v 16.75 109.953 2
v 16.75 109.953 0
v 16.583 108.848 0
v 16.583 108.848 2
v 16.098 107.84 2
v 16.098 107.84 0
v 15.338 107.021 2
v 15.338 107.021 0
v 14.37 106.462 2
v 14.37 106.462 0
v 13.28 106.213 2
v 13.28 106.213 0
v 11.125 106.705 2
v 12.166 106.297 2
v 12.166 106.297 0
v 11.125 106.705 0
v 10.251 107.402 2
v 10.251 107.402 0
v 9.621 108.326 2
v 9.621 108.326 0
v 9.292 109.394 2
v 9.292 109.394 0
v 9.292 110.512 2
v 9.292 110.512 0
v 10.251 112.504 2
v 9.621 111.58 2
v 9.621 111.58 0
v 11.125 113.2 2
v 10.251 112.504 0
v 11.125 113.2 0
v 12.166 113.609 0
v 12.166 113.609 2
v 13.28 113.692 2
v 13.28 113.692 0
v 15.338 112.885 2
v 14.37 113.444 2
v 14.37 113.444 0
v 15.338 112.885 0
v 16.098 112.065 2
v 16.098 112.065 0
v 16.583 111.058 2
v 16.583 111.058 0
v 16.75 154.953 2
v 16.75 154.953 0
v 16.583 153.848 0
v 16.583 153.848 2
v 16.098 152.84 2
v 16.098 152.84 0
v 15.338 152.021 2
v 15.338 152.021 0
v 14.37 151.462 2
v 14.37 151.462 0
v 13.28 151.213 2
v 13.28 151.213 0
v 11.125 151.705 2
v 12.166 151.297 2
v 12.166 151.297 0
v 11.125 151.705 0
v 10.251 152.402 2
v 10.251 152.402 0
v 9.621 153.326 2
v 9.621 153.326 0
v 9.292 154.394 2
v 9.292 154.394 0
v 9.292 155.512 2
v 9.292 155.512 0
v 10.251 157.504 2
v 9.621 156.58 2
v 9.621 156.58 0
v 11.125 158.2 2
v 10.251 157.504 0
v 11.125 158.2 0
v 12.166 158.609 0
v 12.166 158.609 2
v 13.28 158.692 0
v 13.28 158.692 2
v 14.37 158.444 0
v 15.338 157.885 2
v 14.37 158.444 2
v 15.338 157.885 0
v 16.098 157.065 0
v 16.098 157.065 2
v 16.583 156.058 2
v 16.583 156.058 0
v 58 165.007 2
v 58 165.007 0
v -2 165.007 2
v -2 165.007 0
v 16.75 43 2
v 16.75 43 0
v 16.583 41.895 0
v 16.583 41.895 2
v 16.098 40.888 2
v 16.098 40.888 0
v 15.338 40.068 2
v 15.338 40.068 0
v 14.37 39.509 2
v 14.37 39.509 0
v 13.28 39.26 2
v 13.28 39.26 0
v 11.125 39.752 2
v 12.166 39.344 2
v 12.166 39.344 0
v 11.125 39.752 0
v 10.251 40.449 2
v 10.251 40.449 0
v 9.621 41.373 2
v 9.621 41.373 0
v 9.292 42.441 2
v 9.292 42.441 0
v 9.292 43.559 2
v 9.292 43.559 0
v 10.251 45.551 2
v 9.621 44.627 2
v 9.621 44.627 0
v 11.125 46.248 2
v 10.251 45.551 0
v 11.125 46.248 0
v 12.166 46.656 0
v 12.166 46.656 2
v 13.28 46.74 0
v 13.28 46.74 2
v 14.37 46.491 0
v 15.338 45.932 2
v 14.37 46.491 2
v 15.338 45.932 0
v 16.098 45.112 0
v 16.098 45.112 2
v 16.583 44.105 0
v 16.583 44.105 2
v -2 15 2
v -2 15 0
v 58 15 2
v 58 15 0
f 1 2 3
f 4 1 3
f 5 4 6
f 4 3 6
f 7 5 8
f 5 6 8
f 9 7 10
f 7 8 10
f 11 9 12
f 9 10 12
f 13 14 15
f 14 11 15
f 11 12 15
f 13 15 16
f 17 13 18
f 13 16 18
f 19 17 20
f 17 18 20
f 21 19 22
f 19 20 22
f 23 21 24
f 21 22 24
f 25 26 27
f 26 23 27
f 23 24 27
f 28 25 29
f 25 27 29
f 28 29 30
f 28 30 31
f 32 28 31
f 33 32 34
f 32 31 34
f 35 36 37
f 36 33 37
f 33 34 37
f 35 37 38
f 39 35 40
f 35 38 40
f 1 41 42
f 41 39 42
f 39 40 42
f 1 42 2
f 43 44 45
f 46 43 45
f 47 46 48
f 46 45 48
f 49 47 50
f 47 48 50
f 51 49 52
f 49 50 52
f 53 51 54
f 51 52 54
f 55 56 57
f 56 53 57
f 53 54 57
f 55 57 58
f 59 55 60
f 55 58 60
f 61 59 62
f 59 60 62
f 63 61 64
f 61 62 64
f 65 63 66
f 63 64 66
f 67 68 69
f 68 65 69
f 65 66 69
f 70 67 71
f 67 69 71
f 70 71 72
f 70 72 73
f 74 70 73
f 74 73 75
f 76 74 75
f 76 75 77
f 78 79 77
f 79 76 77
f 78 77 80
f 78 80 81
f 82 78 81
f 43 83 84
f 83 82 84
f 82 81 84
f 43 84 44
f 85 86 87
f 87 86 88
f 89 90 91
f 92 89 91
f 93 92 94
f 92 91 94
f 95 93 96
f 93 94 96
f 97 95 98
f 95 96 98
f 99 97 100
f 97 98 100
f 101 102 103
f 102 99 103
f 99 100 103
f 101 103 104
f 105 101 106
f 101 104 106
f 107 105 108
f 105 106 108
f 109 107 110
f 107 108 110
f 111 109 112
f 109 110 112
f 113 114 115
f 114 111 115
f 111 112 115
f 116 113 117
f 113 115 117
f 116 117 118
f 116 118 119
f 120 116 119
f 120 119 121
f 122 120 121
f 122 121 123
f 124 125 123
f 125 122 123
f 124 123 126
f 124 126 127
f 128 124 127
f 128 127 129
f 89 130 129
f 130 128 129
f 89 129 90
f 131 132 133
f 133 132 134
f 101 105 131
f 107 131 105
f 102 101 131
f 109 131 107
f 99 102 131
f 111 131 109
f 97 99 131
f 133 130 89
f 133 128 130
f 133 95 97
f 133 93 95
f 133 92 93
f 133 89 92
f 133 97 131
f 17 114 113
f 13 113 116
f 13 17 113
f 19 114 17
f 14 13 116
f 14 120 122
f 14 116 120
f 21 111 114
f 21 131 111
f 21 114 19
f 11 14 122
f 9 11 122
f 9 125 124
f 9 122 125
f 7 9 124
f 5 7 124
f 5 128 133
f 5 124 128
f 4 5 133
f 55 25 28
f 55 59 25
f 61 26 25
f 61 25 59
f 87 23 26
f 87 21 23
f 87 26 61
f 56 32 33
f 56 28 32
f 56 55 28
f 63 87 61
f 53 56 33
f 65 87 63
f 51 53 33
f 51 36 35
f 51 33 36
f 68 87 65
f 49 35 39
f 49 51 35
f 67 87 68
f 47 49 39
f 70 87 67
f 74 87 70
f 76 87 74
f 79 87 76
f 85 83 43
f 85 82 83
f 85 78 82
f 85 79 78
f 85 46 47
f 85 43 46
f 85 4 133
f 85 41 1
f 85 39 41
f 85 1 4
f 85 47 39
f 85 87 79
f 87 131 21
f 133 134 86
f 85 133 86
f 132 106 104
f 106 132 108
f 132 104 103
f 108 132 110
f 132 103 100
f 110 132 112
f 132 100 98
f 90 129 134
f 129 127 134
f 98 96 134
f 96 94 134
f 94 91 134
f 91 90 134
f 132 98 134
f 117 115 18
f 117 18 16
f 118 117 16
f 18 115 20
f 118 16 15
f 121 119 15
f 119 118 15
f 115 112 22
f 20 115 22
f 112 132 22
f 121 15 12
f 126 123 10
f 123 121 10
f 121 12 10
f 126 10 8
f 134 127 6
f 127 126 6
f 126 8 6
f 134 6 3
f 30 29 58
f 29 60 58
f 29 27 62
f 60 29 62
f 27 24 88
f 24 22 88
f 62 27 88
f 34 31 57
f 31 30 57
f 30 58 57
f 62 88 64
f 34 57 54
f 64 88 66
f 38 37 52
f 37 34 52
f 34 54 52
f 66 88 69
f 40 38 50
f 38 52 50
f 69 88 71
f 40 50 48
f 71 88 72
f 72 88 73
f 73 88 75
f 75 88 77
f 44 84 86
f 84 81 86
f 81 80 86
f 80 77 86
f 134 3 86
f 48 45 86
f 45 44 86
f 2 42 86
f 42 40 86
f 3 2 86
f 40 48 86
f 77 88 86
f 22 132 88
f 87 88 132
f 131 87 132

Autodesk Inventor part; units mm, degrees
ref_plane "YZ Plane" through (0, 0, 0) normal (1, 0, 0) x (0, 1, 0)
ref_plane "XZ Plane" through (0, 0, 0) normal (0, 1, 0) x (-1, 0, 0)
ref_plane "XY Plane" through (0, 0, 0) normal (0, 0, 1) x (1, 0, 0)
sketch "Sketch1" plane through (0, 0, 0) normal (0, 0, 1) x (1, 0, 0)
  line L0 (16.1981, 153.4586) -> (16.9799, 152.4795) construction
  arc A0 (16.1981, 153.4586) -> (16.1981, 156.4471) centre (13, 154.9529) ccw construction
  line L1 (16.9799, 157.4262) -> (16.1981, 156.4471) construction
  arc A1 (16.9799, 157.4262) -> (15.4733, 158.9328) centre (16.1422, 158.0951) ccw construction
  line L2 (14.4942, 158.151) -> (15.4733, 158.9328) construction
  arc A2 (14.4942, 158.151) -> (11.5058, 158.151) centre (13, 154.9529) ccw construction
  line L3 (10.5267, 158.9328) -> (11.5058, 158.151) construction
  arc A3 (10.5267, 158.9328) -> (9.0201, 157.4262) centre (9.8578, 158.0951) ccw construction
  line L4 (9.8019, 156.4471) -> (9.0201, 157.4262) construction
  arc A4 (9.8019, 156.4471) -> (9.8019, 153.4586) centre (13, 154.9529) ccw construction
  line L5 (9.0201, 152.4795) -> (9.8019, 153.4586) construction
  arc A5 (9.0201, 152.4795) -> (10.5267, 150.9729) centre (9.8578, 151.8106) ccw construction
  line L6 (11.5058, 151.7547) -> (10.5267, 150.9729) construction
  arc A6 (11.5058, 151.7547) -> (14.4942, 151.7547) centre (13, 154.9529) ccw construction
  line L7 (15.4733, 150.9729) -> (14.4942, 151.7547) construction
  arc A7 (15.4733, 150.9729) -> (16.9799, 152.4795) centre (16.1422, 151.8106) ccw construction
  line L8 (26.6999, 145.0719) -> (26.6999, 142.2529) construction
  arc A8 (26.6999, 145.0719) -> (26.319, 145.4529) centre (26.319, 145.0719) ccw construction
  line L9 (22.88, 145.4529) -> (26.319, 145.4529) construction
  arc A9 (22.88, 145.4529) -> (22.5, 145.0729) centre (22.88, 145.0729) ccw construction
  line L10 (22.5, 141.6339) -> (22.5, 145.0729) construction
  arc A10 (22.5, 141.6339) -> (22.881, 141.2529) centre (22.881, 141.6339) ccw construction
  line L11 (25.7, 141.2529) -> (22.881, 141.2529) construction
  arc A11 (25.7, 141.2529) -> (26.6999, 142.2529) centre (25.7, 142.2529) ccw construction
  line L12 (-0.6999, 164.8338) -> (-0.6999, 167.6528) construction
  arc A12 (-0.6999, 164.8338) -> (-0.3189, 164.4528) centre (-0.3189, 164.8338) ccw construction
  line L13 (3.12, 164.4528) -> (-0.3189, 164.4528) construction
  arc A13 (3.12, 164.4528) -> (3.5, 164.8328) centre (3.12, 164.8328) ccw construction
  line L14 (3.5, 168.2718) -> (3.5, 164.8328) construction
  arc A14 (3.5, 168.2718) -> (3.119, 168.6528) centre (3.119, 168.2718) ccw construction
  line L15 (0.3001, 168.6528) -> (3.119, 168.6528) construction
  arc A15 (0.3001, 168.6528) -> (-0.6999, 167.6528) centre (0.3001, 167.6528) ccw construction
  line L16 (22.881, 168.6528) -> (25.7, 168.6528) construction
  arc A16 (22.881, 168.6528) -> (22.5, 168.2718) centre (22.881, 168.2718) ccw construction
  line L17 (22.5, 164.8328) -> (22.5, 168.2718) construction
  arc A17 (22.5, 164.8328) -> (22.88, 164.4528) centre (22.88, 164.8328) ccw construction
  line L18 (26.319, 164.4528) -> (22.88, 164.4528) construction
  arc A18 (26.319, 164.4528) -> (26.6999, 164.8338) centre (26.319, 164.8338) ccw construction
  line L19 (26.6999, 167.6528) -> (26.6999, 164.8338) construction
  arc A19 (26.6999, 167.6528) -> (25.7, 168.6528) centre (25.7, 167.6528) ccw construction
  line L20 (-0.3189, 145.4529) -> (3.12, 145.4529) construction
  arc A20 (-0.3189, 145.4529) -> (-0.6999, 145.0719) centre (-0.3189, 145.0719) ccw construction
  line L21 (-0.6999, 142.2529) -> (-0.6999, 145.0719) construction
  arc A21 (-0.6999, 142.2529) -> (0.3001, 141.2529) centre (0.3001, 142.2529) ccw construction
  line L22 (3.119, 141.2529) -> (0.3001, 141.2529) construction
  arc A22 (3.119, 141.2529) -> (3.5, 141.6339) centre (3.119, 141.6339) ccw construction
  line L23 (3.5, 145.0729) -> (3.5, 141.6339) construction
  arc A23 (3.5, 145.0729) -> (3.12, 145.4529) centre (3.12, 145.0729) ccw construction
  line L24 (8.5, 142.2104) -> (5.2675, 142.2104) construction
  arc A24 (9, 141.7104) -> (8.5, 142.2104) centre (8.5, 141.7104) ccw construction
  line L25 (9, 140.4529) -> (9, 141.7104) construction
  arc A25 (8.5, 139.9529) -> (9, 140.4529) centre (8.5, 140.4529) ccw construction
  line L26 (0.0001, 139.9529) -> (8.5, 139.9529) construction
  arc A26 (-1.9999, 141.9529) -> (0.0001, 139.9529) centre (0.0001, 141.9529) ccw construction
  line L27 (-1.9999, 150.4529) -> (-1.9999, 141.9529) construction
  arc A27 (-1.4999, 150.9529) -> (-1.9999, 150.4529) centre (-1.4999, 150.4529) ccw construction
  line L28 (-0.2425, 150.9529) -> (-1.4999, 150.9529) construction
  arc A28 (0.2575, 150.4529) -> (-0.2425, 150.9529) centre (-0.2425, 150.4529) ccw construction
  line L29 (0.2575, 147.2203) -> (0.2575, 150.4529) construction
  arc A29 (0.2575, 147.2203) -> (0.7572, 146.7029) centre (0.7572, 147.2029) ccw construction
  line L30 (2.7398, 146.7029) -> (0.7572, 146.7029) construction
  arc A30 (2.7398, 146.7029) -> (3.0934, 146.8493) centre (2.7398, 147.2029) ccw construction
  line L31 (7.0189, 150.7749) -> (3.0934, 146.8493) construction
  arc A31 (7.0189, 150.7749) -> (7.1653, 151.1284) centre (6.6653, 151.1284) ccw construction
  line L32 (7.1653, 154.0029) -> (7.1653, 151.1284) construction
  line L33 (7.6753, 154.9529) -> (7.1653, 154.0029) construction
  line L34 (7.1653, 155.9029) -> (7.6753, 154.9529) construction
  line L35 (7.1653, 158.7773) -> (7.1653, 155.9029) construction
  arc A32 (7.1653, 158.7773) -> (7.0189, 159.1309) centre (6.6653, 158.7773) ccw construction
  line L36 (3.0934, 163.0564) -> (7.0189, 159.1309) construction
  arc A33 (3.0934, 163.0564) -> (2.7398, 163.2028) centre (2.7398, 162.7028) ccw construction
  line L37 (0.7572, 163.2028) -> (2.7398, 163.2028) construction
  arc A34 (0.7572, 163.2028) -> (0.2575, 162.6854) centre (0.7572, 162.7028) ccw construction
  line L38 (0.2575, 159.4529) -> (0.2575, 162.6854) construction
  arc A35 (-0.2425, 158.9529) -> (0.2575, 159.4529) centre (-0.2425, 159.4529) ccw construction
  line L39 (-1.4999, 158.9529) -> (-0.2425, 158.9529) construction
  arc A36 (-1.9999, 159.4529) -> (-1.4999, 158.9529) centre (-1.4999, 159.4529) ccw construction
  line L40 (-1.9999, 167.9528) -> (-1.9999, 159.4529) construction
  arc A37 (0.0001, 169.9528) -> (-1.9999, 167.9528) centre (0.0001, 167.9528) ccw construction
  line L41 (8.5, 169.9528) -> (0.0001, 169.9528) construction
  arc A38 (9, 169.4528) -> (8.5, 169.9528) centre (8.5, 169.4528) ccw construction
  line L42 (9, 168.1953) -> (9, 169.4528) construction
  arc A39 (8.5, 167.6953) -> (9, 168.1953) centre (8.5, 168.1953) ccw construction
  line L43 (5.2675, 167.6953) -> (8.5, 167.6953) construction
  arc A40 (5.2675, 167.6953) -> (4.75, 167.1956) centre (5.25, 167.1956) ccw construction
  line L44 (4.75, 165.2131) -> (4.75, 167.1956) construction
  arc A41 (4.75, 165.2131) -> (4.8965, 164.8595) centre (5.25, 165.2131) ccw construction
  line L45 (8.822, 160.934) -> (4.8965, 164.8595) construction
  arc A42 (8.822, 160.934) -> (9.1756, 160.7875) centre (9.1756, 161.2875) ccw construction
  line L46 (12.1125, 160.7875) -> (9.1756, 160.7875) construction
  line L47 (13.0625, 160.2775) -> (12.1125, 160.7875) construction
  line L48 (14.0125, 160.7875) -> (13.0625, 160.2775) construction
  line L49 (16.8245, 160.7875) -> (14.0125, 160.7875) construction
  arc A43 (16.8245, 160.7875) -> (17.178, 160.934) centre (16.8245, 161.2875) ccw construction
  line L50 (21.1035, 164.8595) -> (17.178, 160.934) construction
  arc A44 (21.1035, 164.8595) -> (21.25, 165.2131) centre (20.75, 165.2131) ccw construction
  line L51 (21.25, 167.1956) -> (21.25, 165.2131) construction
  arc A45 (21.25, 167.1956) -> (20.7325, 167.6953) centre (20.75, 167.1956) ccw construction
  line L52 (17.5, 167.6953) -> (20.7325, 167.6953) construction
  arc A46 (17, 168.1953) -> (17.5, 167.6953) centre (17.5, 168.1953) ccw construction
  line L53 (17, 169.4528) -> (17, 168.1953) construction
  arc A47 (17.5, 169.9528) -> (17, 169.4528) centre (17.5, 169.4528) ccw construction
  line L54 (26, 169.9528) -> (17.5, 169.9528) construction
  arc A48 (27.9999, 167.9528) -> (26, 169.9528) centre (26, 167.9528) ccw construction
  line L55 (27.9999, 159.4529) -> (27.9999, 167.9528) construction
  arc A49 (27.4999, 158.9529) -> (27.9999, 159.4529) centre (27.4999, 159.4529) ccw construction
  line L56 (26.2425, 158.9529) -> (27.4999, 158.9529) construction
  arc A50 (25.7425, 159.4529) -> (26.2425, 158.9529) centre (26.2425, 159.4529) ccw construction
  line L57 (25.7425, 162.6854) -> (25.7425, 159.4529) construction
  arc A51 (25.7425, 162.6854) -> (25.2428, 163.2028) centre (25.2428, 162.7028) ccw construction
  line L58 (23.2602, 163.2028) -> (25.2428, 163.2028) construction
  arc A52 (23.2602, 163.2028) -> (22.9066, 163.0564) centre (23.2602, 162.7028) ccw construction
  line L59 (18.9811, 159.1309) -> (22.9066, 163.0564) construction
  arc A53 (18.9811, 159.1309) -> (18.8347, 158.7773) centre (19.3347, 158.7773) ccw construction
  line L60 (18.8347, 155.9029) -> (18.8347, 158.7773) construction
  line L61 (18.3247, 154.9529) -> (18.8347, 155.9029) construction
  line L62 (18.8347, 154.0029) -> (18.3247, 154.9529) construction
  line L63 (18.8347, 151.1284) -> (18.8347, 154.0029) construction
  arc A54 (18.8347, 151.1284) -> (18.9811, 150.7749) centre (19.3347, 151.1284) ccw construction
  line L64 (22.9066, 146.8493) -> (18.9811, 150.7749) construction
  arc A55 (22.9066, 146.8493) -> (23.2602, 146.7029) centre (23.2602, 147.2029) ccw construction
  line L65 (25.2428, 146.7029) -> (23.2602, 146.7029) construction
  arc A56 (25.2428, 146.7029) -> (25.7425, 147.2203) centre (25.2428, 147.2029) ccw construction
  line L66 (25.7425, 150.4529) -> (25.7425, 147.2203) construction
  arc A57 (26.2425, 150.9529) -> (25.7425, 150.4529) centre (26.2425, 150.4529) ccw construction
  line L67 (27.4999, 150.9529) -> (26.2425, 150.9529) construction
  arc A58 (27.9999, 150.4529) -> (27.4999, 150.9529) centre (27.4999, 150.4529) ccw construction
  line L68 (27.9999, 141.9529) -> (27.9999, 150.4529) construction
  arc A59 (26, 139.9529) -> (27.9999, 141.9529) centre (26, 141.9529) ccw construction
  line L69 (17.5, 139.9529) -> (26, 139.9529) construction
  arc A60 (17, 140.4529) -> (17.5, 139.9529) centre (17.5, 140.4529) ccw construction
  line L70 (17, 141.7104) -> (17, 140.4529) construction
  arc A61 (17.5, 142.2104) -> (17, 141.7104) centre (17.5, 141.7104) ccw construction
  line L71 (20.7325, 142.2104) -> (17.5, 142.2104) construction
  arc A62 (20.7325, 142.2104) -> (21.25, 142.7101) centre (20.75, 142.7101) ccw construction
  line L72 (21.25, 144.6927) -> (21.25, 142.7101) construction
  arc A63 (21.25, 144.6927) -> (21.1035, 145.0462) centre (20.75, 144.6927) ccw construction
  line L73 (17.178, 148.9717) -> (21.1035, 145.0462) construction
  arc A64 (17.178, 148.9717) -> (16.8245, 149.1182) centre (16.8245, 148.6182) ccw construction
  line L74 (14.0125, 149.1182) -> (16.8245, 149.1182) construction
  line L75 (13.0625, 149.6282) -> (14.0125, 149.1182) construction
  line L76 (12.1125, 149.1182) -> (13.0625, 149.6282) construction
  line L77 (9.1756, 149.1182) -> (12.1125, 149.1182) construction
  arc A65 (9.1756, 149.1182) -> (8.822, 148.9717) centre (9.1756, 148.6182) ccw construction
  line L78 (4.8965, 145.0462) -> (8.822, 148.9717) construction
  arc A66 (4.8965, 145.0462) -> (4.75, 144.6927) centre (5.25, 144.6927) ccw construction
  line L79 (4.75, 142.7101) -> (4.75, 144.6927) construction
  arc A67 (4.75, 142.7101) -> (5.2675, 142.2104) centre (5.25, 142.7101) ccw construction
  line L80 (16.1981, -1.4942) -> (16.9799, -2.4733) construction
  arc A68 (16.1981, -1.4942) -> (16.1981, 1.4942) centre (13, 0) ccw construction
  line L81 (16.9799, 2.4733) -> (16.1981, 1.4942) construction
  arc A69 (16.9799, 2.4733) -> (15.4733, 3.9799) centre (16.1422, 3.1422) ccw construction
  line L82 (14.4942, 3.1981) -> (15.4733, 3.9799) construction
  arc A70 (14.4942, 3.1981) -> (11.5058, 3.1981) centre (13, 0) ccw construction
  line L83 (10.5267, 3.9799) -> (11.5058, 3.1981) construction
  arc A71 (10.5267, 3.9799) -> (9.0201, 2.4733) centre (9.8578, 3.1422) ccw construction
  line L84 (9.8019, 1.4942) -> (9.0201, 2.4733) construction
  arc A72 (9.8019, 1.4942) -> (9.8019, -1.4942) centre (13, 0) ccw construction
  line L85 (9.0201, -2.4733) -> (9.8019, -1.4942) construction
  arc A73 (9.0201, -2.4733) -> (10.5267, -3.9799) centre (9.8578, -3.1422) ccw construction
  line L86 (11.5058, -3.1981) -> (10.5267, -3.9799) construction
  arc A74 (11.5058, -3.1981) -> (14.4942, -3.1981) centre (13, 0) ccw construction
  line L87 (15.4733, -3.9799) -> (14.4942, -3.1981) construction
  arc A75 (15.4733, -3.9799) -> (16.9799, -2.4733) centre (16.1422, -3.1422) ccw construction
  line L88 (26.6999, -9.881) -> (26.6999, -12.6999) construction
  arc A76 (26.6999, -9.881) -> (26.319, -9.5) centre (26.319, -9.881) ccw construction
  line L89 (22.88, -9.5) -> (26.319, -9.5) construction
  arc A77 (22.88, -9.5) -> (22.5, -9.88) centre (22.88, -9.88) ccw construction
  line L90 (22.5, -13.3189) -> (22.5, -9.88) construction
  arc A78 (22.5, -13.3189) -> (22.881, -13.6999) centre (22.881, -13.3189) ccw construction
  line L91 (25.7, -13.6999) -> (22.881, -13.6999) construction
  arc A79 (25.7, -13.6999) -> (26.6999, -12.6999) centre (25.7, -12.6999) ccw construction
  line L92 (-0.6999, 9.881) -> (-0.6999, 12.6999) construction
  arc A80 (-0.6999, 9.881) -> (-0.3189, 9.5) centre (-0.3189, 9.881) ccw construction
  line L93 (3.12, 9.5) -> (-0.3189, 9.5) construction
  arc A81 (3.12, 9.5) -> (3.5, 9.88) centre (3.12, 9.88) ccw construction
  line L94 (3.5, 13.3189) -> (3.5, 9.88) construction
  arc A82 (3.5, 13.3189) -> (3.119, 13.6999) centre (3.119, 13.3189) ccw construction
  line L95 (0.3001, 13.6999) -> (3.119, 13.6999) construction
  arc A83 (0.3001, 13.6999) -> (-0.6999, 12.6999) centre (0.3001, 12.6999) ccw construction
  line L96 (22.881, 13.6999) -> (25.7, 13.6999) construction
  arc A84 (22.881, 13.6999) -> (22.5, 13.3189) centre (22.881, 13.3189) ccw construction
  line L97 (22.5, 9.88) -> (22.5, 13.3189) construction
  arc A85 (22.5, 9.88) -> (22.88, 9.5) centre (22.88, 9.88) ccw construction
  line L98 (26.319, 9.5) -> (22.88, 9.5) construction
  arc A86 (26.319, 9.5) -> (26.6999, 9.881) centre (26.319, 9.881) ccw construction
  line L99 (26.6999, 12.6999) -> (26.6999, 9.881) construction
  arc A87 (26.6999, 12.6999) -> (25.7, 13.6999) centre (25.7, 12.6999) ccw construction
  line L100 (-0.3189, -9.5) -> (3.12, -9.5) construction
  arc A88 (-0.3189, -9.5) -> (-0.6999, -9.881) centre (-0.3189, -9.881) ccw construction
  line L101 (-0.6999, -12.6999) -> (-0.6999, -9.881) construction
  arc A89 (-0.6999, -12.6999) -> (0.3001, -13.6999) centre (0.3001, -12.6999) ccw construction
  line L102 (3.119, -13.6999) -> (0.3001, -13.6999) construction
  arc A90 (3.119, -13.6999) -> (3.5, -13.3189) centre (3.119, -13.3189) ccw construction
  line L103 (3.5, -9.88) -> (3.5, -13.3189) construction
  arc A91 (3.5, -9.88) -> (3.12, -9.5) centre (3.12, -9.88) ccw construction
  line L104 (8.5, -12.7425) -> (5.2675, -12.7425) construction
  arc A92 (9, -13.2425) -> (8.5, -12.7425) centre (8.5, -13.2425) ccw construction
  line L105 (9, -14.4999) -> (9, -13.2425) construction
  arc A93 (8.5, -14.9999) -> (9, -14.4999) centre (8.5, -14.4999) ccw construction
  line L106 (0.0001, -14.9999) -> (8.5, -14.9999) construction
  arc A94 (-1.9999, -12.9999) -> (0.0001, -14.9999) centre (0.0001, -12.9999) ccw construction
  line L107 (-1.9999, -4.5) -> (-1.9999, -12.9999) construction
  arc A95 (-1.4999, -4) -> (-1.9999, -4.5) centre (-1.4999, -4.5) ccw construction
  line L108 (-0.2425, -4) -> (-1.4999, -4) construction
  arc A96 (0.2575, -4.5) -> (-0.2425, -4) centre (-0.2425, -4.5) ccw construction
  line L109 (0.2575, -7.7325) -> (0.2575, -4.5) construction
  arc A97 (0.2575, -7.7325) -> (0.7572, -8.25) centre (0.7572, -7.75) ccw construction
  line L110 (2.7398, -8.25) -> (0.7572, -8.25) construction
  arc A98 (2.7398, -8.25) -> (3.0934, -8.1035) centre (2.7398, -7.75) ccw construction
  line L111 (7.0189, -4.178) -> (3.0934, -8.1035) construction
  arc A99 (7.0189, -4.178) -> (7.1653, -3.8245) centre (6.6653, -3.8245) ccw construction
  line L112 (7.1653, -0.95) -> (7.1653, -3.8245) construction
  line L113 (7.6753, 0) -> (7.1653, -0.95) construction
  line L114 (7.1653, 0.95) -> (7.6753, 0) construction
  line L115 (7.1653, 3.8245) -> (7.1653, 0.95) construction
  arc A100 (7.1653, 3.8245) -> (7.0189, 4.178) centre (6.6653, 3.8245) ccw construction
  line L116 (3.0934, 8.1035) -> (7.0189, 4.178) construction
  arc A101 (3.0934, 8.1035) -> (2.7398, 8.25) centre (2.7398, 7.75) ccw construction
  line L117 (0.7572, 8.25) -> (2.7398, 8.25) construction
  arc A102 (0.7572, 8.25) -> (0.2575, 7.7325) centre (0.7572, 7.75) ccw construction
  line L118 (0.2575, 4.5) -> (0.2575, 7.7325) construction
  arc A103 (-0.2425, 4) -> (0.2575, 4.5) centre (-0.2425, 4.5) ccw construction
  line L119 (-1.4999, 4) -> (-0.2425, 4) construction
  arc A104 (-1.9999, 4.5) -> (-1.4999, 4) centre (-1.4999, 4.5) ccw construction
  line L120 (-1.9999, 12.9999) -> (-1.9999, 4.5) construction
  arc A105 (0.0001, 14.9999) -> (-1.9999, 12.9999) centre (0.0001, 12.9999) ccw construction
  line L121 (8.5, 14.9999) -> (0.0001, 14.9999) construction
  arc A106 (9, 14.4999) -> (8.5, 14.9999) centre (8.5, 14.4999) ccw construction
  line L122 (9, 13.2425) -> (9, 14.4999) construction
  arc A107 (8.5, 12.7425) -> (9, 13.2425) centre (8.5, 13.2425) ccw construction
  line L123 (5.2675, 12.7425) -> (8.5, 12.7425) construction
  arc A108 (5.2675, 12.7425) -> (4.75, 12.2428) centre (5.25, 12.2428) ccw construction
  line L124 (4.75, 10.2602) -> (4.75, 12.2428) construction
  arc A109 (4.75, 10.2602) -> (4.8965, 9.9066) centre (5.25, 10.2602) ccw construction
  line L125 (8.822, 5.9811) -> (4.8965, 9.9066) construction
  arc A110 (8.822, 5.9811) -> (9.1756, 5.8347) centre (9.1756, 6.3347) ccw construction
  line L126 (12.1125, 5.8347) -> (9.1756, 5.8347) construction
  line L127 (13.0625, 5.3247) -> (12.1125, 5.8347) construction
  line L128 (14.0125, 5.8347) -> (13.0625, 5.3247) construction
  line L129 (16.8245, 5.8347) -> (14.0125, 5.8347) construction
  arc A111 (16.8245, 5.8347) -> (17.178, 5.9811) centre (16.8245, 6.3347) ccw construction
  line L130 (21.1035, 9.9066) -> (17.178, 5.9811) construction
  arc A112 (21.1035, 9.9066) -> (21.25, 10.2602) centre (20.75, 10.2602) ccw construction
  line L131 (21.25, 12.2428) -> (21.25, 10.2602) construction
  arc A113 (21.25, 12.2428) -> (20.7325, 12.7425) centre (20.75, 12.2428) ccw construction
  line L132 (17.5, 12.7425) -> (20.7325, 12.7425) construction
  arc A114 (17, 13.2425) -> (17.5, 12.7425) centre (17.5, 13.2425) ccw construction
  line L133 (17, 14.4999) -> (17, 13.2425) construction
  arc A115 (17.5, 14.9999) -> (17, 14.4999) centre (17.5, 14.4999) ccw construction
  line L134 (26, 14.9999) -> (17.5, 14.9999) construction
  arc A116 (27.9999, 12.9999) -> (26, 14.9999) centre (26, 12.9999) ccw construction
  line L135 (27.9999, 4.5) -> (27.9999, 12.9999) construction
  arc A117 (27.4999, 4) -> (27.9999, 4.5) centre (27.4999, 4.5) ccw construction
  line L136 (26.2425, 4) -> (27.4999, 4) construction
  arc A118 (25.7425, 4.5) -> (26.2425, 4) centre (26.2425, 4.5) ccw construction
  line L137 (25.7425, 7.7325) -> (25.7425, 4.5) construction
  arc A119 (25.7425, 7.7325) -> (25.2428, 8.25) centre (25.2428, 7.75) ccw construction
  line L138 (23.2602, 8.25) -> (25.2428, 8.25) construction
  arc A120 (23.2602, 8.25) -> (22.9066, 8.1035) centre (23.2602, 7.75) ccw construction
  line L139 (18.9811, 4.178) -> (22.9066, 8.1035) construction
  arc A121 (18.9811, 4.178) -> (18.8347, 3.8245) centre (19.3347, 3.8245) ccw construction
  line L140 (18.8347, 0.95) -> (18.8347, 3.8245) construction
  line L141 (18.3247, 0) -> (18.8347, 0.95) construction
  line L142 (18.8347, -0.95) -> (18.3247, 0) construction
  line L143 (18.8347, -3.8245) -> (18.8347, -0.95) construction
  arc A122 (18.8347, -3.8245) -> (18.9811, -4.178) centre (19.3347, -3.8245) ccw construction
  line L144 (22.9066, -8.1035) -> (18.9811, -4.178) construction
  arc A123 (22.9066, -8.1035) -> (23.2602, -8.25) centre (23.2602, -7.75) ccw construction
  line L145 (25.2428, -8.25) -> (23.2602, -8.25) construction
  arc A124 (25.2428, -8.25) -> (25.7425, -7.7325) centre (25.2428, -7.75) ccw construction
  line L146 (25.7425, -4.5) -> (25.7425, -7.7325) construction
  arc A125 (26.2425, -4) -> (25.7425, -4.5) centre (26.2425, -4.5) ccw construction
  line L147 (27.4999, -4) -> (26.2425, -4) construction
  arc A126 (27.9999, -4.5) -> (27.4999, -4) centre (27.4999, -4.5) ccw construction
  line L148 (27.9999, -12.9999) -> (27.9999, -4.5) construction
  arc A127 (26, -14.9999) -> (27.9999, -12.9999) centre (26, -12.9999) ccw construction
  line L149 (17.5, -14.9999) -> (26, -14.9999) construction
  arc A128 (17, -14.4999) -> (17.5, -14.9999) centre (17.5, -14.4999) ccw construction
  line L150 (17, -13.2425) -> (17, -14.4999) construction
  arc A129 (17.5, -12.7425) -> (17, -13.2425) centre (17.5, -13.2425) ccw construction
  line L151 (20.7325, -12.7425) -> (17.5, -12.7425) construction
  arc A130 (20.7325, -12.7425) -> (21.25, -12.2428) centre (20.75, -12.2428) ccw construction
  line L152 (21.25, -10.2602) -> (21.25, -12.2428) construction
  arc A131 (21.25, -10.2602) -> (21.1035, -9.9066) centre (20.75, -10.2602) ccw construction
  line L153 (17.178, -5.9811) -> (21.1035, -9.9066) construction
  arc A132 (17.178, -5.9811) -> (16.8245, -5.8347) centre (16.8245, -6.3347) ccw construction
  line L154 (14.0125, -5.8347) -> (16.8245, -5.8347) construction
  line L155 (13.0625, -5.3247) -> (14.0125, -5.8347) construction
  line L156 (12.1125, -5.8347) -> (13.0625, -5.3247) construction
  line L157 (9.1756, -5.8347) -> (12.1125, -5.8347) construction
  arc A133 (9.1756, -5.8347) -> (8.822, -5.9811) centre (9.1756, -6.3347) ccw construction
  line L158 (4.8965, -9.9066) -> (8.822, -5.9811) construction
  arc A134 (4.8965, -9.9066) -> (4.75, -10.2602) centre (5.25, -10.2602) ccw construction
  line L159 (4.75, -12.2428) -> (4.75, -10.2602) construction
  arc A135 (4.75, -12.2428) -> (5.2675, -12.7425) centre (5.25, -12.2428) ccw construction
  line L160 (8.5, 122.6953) -> (5.2675, 122.6953) construction
  arc A136 (5.2675, 122.6953) -> (4.75, 122.1956) centre (5.25, 122.1956) ccw construction
  line L161 (4.75, 122.1956) -> (4.75, 120.2131) construction
  arc A137 (4.75, 120.2131) -> (4.8965, 119.8595) centre (5.25, 120.2131) ccw construction
  line L162 (4.8965, 119.8595) -> (8.822, 115.934) construction
  arc A138 (8.822, 115.934) -> (9.1756, 115.7875) centre (9.1756, 116.2875) ccw construction
  line L163 (9.1756, 115.7875) -> (12.1125, 115.7875) construction
  line L164 (12.1125, 115.7875) -> (13.0625, 115.2775) construction
  line L165 (13.0625, 115.2775) -> (14.0125, 115.7875) construction
  line L166 (14.0125, 115.7875) -> (16.8245, 115.7875) construction
  arc A139 (16.8245, 115.7875) -> (17.178, 115.934) centre (16.8245, 116.2875) ccw construction
  line L167 (17.178, 115.934) -> (21.1035, 119.8595) construction
  arc A140 (21.1035, 119.8595) -> (21.25, 120.2131) centre (20.75, 120.2131) ccw construction
  line L168 (21.25, 120.2131) -> (21.25, 122.1956) construction
  arc A141 (21.25, 122.1956) -> (20.7325, 122.6953) centre (20.75, 122.1956) ccw construction
  line L169 (20.7325, 122.6953) -> (17.5, 122.6953) construction
  arc A142 (17, 123.1953) -> (17.5, 122.6953) centre (17.5, 123.1953) ccw construction
  line L170 (17, 123.1953) -> (17, 124.4528) construction
  arc A143 (17.5, 124.9528) -> (17, 124.4528) centre (17.5, 124.4528) ccw construction
  line L171 (17.5, 124.9528) -> (26, 124.9528) construction
  arc A144 (27.9999, 122.9528) -> (26, 124.9528) centre (26, 122.9528) ccw construction
  line L172 (27.9999, 122.9528) -> (27.9999, 114.4529) construction
  arc A145 (27.4999, 113.9529) -> (27.9999, 114.4529) centre (27.4999, 114.4529) ccw construction
  line L173 (27.4999, 113.9529) -> (26.2425, 113.9529) construction
  arc A146 (25.7425, 114.4529) -> (26.2425, 113.9529) centre (26.2425, 114.4529) ccw construction
  line L174 (25.7425, 114.4529) -> (25.7425, 117.6854) construction
  arc A147 (25.7425, 117.6854) -> (25.2428, 118.2028) centre (25.2428, 117.7028) ccw construction
  line L175 (25.2428, 118.2028) -> (23.2602, 118.2028) construction
  arc A148 (23.2602, 118.2028) -> (22.9066, 118.0564) centre (23.2602, 117.7028) ccw construction
  line L176 (22.9066, 118.0564) -> (18.9811, 114.1309) construction
  arc A149 (18.9811, 114.1309) -> (18.8347, 113.7773) centre (19.3347, 113.7773) ccw construction
  line L177 (18.8347, 113.7773) -> (18.8347, 110.9029) construction
  line L178 (18.8347, 110.9029) -> (18.3247, 109.9529) construction
  line L179 (18.3247, 109.9529) -> (18.8347, 109.0029) construction
  line L180 (18.8347, 109.0029) -> (18.8347, 106.1284) construction
  arc A150 (18.8347, 106.1284) -> (18.9811, 105.7749) centre (19.3347, 106.1284) ccw construction
  line L181 (18.9811, 105.7749) -> (22.9066, 101.8493) construction
  arc A151 (22.9066, 101.8493) -> (23.2602, 101.7029) centre (23.2602, 102.2029) ccw construction
  line L182 (23.2602, 101.7029) -> (25.2428, 101.7029) construction
  arc A152 (25.2428, 101.7029) -> (25.7425, 102.2203) centre (25.2428, 102.2029) ccw construction
  line L183 (25.7425, 102.2203) -> (25.7425, 105.4529) construction
  arc A153 (26.2425, 105.9529) -> (25.7425, 105.4529) centre (26.2425, 105.4529) ccw construction
  line L184 (26.2425, 105.9529) -> (27.4999, 105.9529) construction
  arc A154 (27.9999, 105.4529) -> (27.4999, 105.9529) centre (27.4999, 105.4529) ccw construction
  line L185 (27.9999, 105.4529) -> (27.9999, 96.9529) construction
  arc A155 (26, 94.9529) -> (27.9999, 96.9529) centre (26, 96.9529) ccw construction
  line L186 (26, 94.9529) -> (17.5, 94.9529) construction
  arc A156 (17, 95.4529) -> (17.5, 94.9529) centre (17.5, 95.4529) ccw construction
  line L187 (17, 95.4529) -> (17, 96.7104) construction
  arc A157 (17.5, 97.2104) -> (17, 96.7104) centre (17.5, 96.7104) ccw construction
  line L188 (17.5, 97.2104) -> (20.7325, 97.2104) construction
  arc A158 (20.7325, 97.2104) -> (21.25, 97.7101) centre (20.75, 97.7101) ccw construction
  line L189 (21.25, 97.7101) -> (21.25, 99.6927) construction
  arc A159 (21.25, 99.6927) -> (21.1035, 100.0462) centre (20.75, 99.6927) ccw construction
  line L190 (21.1035, 100.0462) -> (17.178, 103.9717) construction
  arc A160 (17.178, 103.9717) -> (16.8245, 104.1182) centre (16.8245, 103.6182) ccw construction
  line L191 (16.8245, 104.1182) -> (14.0125, 104.1182) construction
  line L192 (14.0125, 104.1182) -> (13.0625, 104.6282) construction
  line L193 (13.0625, 104.6282) -> (12.1125, 104.1182) construction
  line L194 (12.1125, 104.1182) -> (9.1756, 104.1182) construction
  arc A161 (9.1756, 104.1182) -> (8.822, 103.9717) centre (9.1756, 103.6182) ccw construction
  line L195 (8.822, 103.9717) -> (4.8965, 100.0462) construction
  arc A162 (4.8965, 100.0462) -> (4.75, 99.6927) centre (5.25, 99.6927) ccw construction
  line L196 (4.75, 99.6927) -> (4.75, 97.7101) construction
  arc A163 (4.75, 97.7101) -> (5.2675, 97.2104) centre (5.25, 97.7101) ccw construction
  line L197 (5.2675, 97.2104) -> (8.5, 97.2104) construction
  arc A164 (9, 96.7104) -> (8.5, 97.2104) centre (8.5, 96.7104) ccw construction
  line L198 (9, 96.7104) -> (9, 95.4529) construction
  arc A165 (8.5, 94.9529) -> (9, 95.4529) centre (8.5, 95.4529) ccw construction
  line L199 (8.5, 94.9529) -> (0.0001, 94.9529) construction
  arc A166 (-1.9999, 96.9529) -> (0.0001, 94.9529) centre (0.0001, 96.9529) ccw construction
  line L200 (-1.9999, 96.9529) -> (-1.9999, 105.4529) construction
  arc A167 (-1.4999, 105.9529) -> (-1.9999, 105.4529) centre (-1.4999, 105.4529) ccw construction
  line L201 (-1.4999, 105.9529) -> (-0.2425, 105.9529) construction
  arc A168 (0.2575, 105.4529) -> (-0.2425, 105.9529) centre (-0.2425, 105.4529) ccw construction
  line L202 (0.2575, 105.4529) -> (0.2575, 102.2203) construction
  arc A169 (0.2575, 102.2203) -> (0.7572, 101.7029) centre (0.7572, 102.2029) ccw construction
  line L203 (0.7572, 101.7029) -> (2.7398, 101.7029) construction
  arc A170 (2.7398, 101.7029) -> (3.0934, 101.8493) centre (2.7398, 102.2029) ccw construction
  line L204 (3.0934, 101.8493) -> (7.0189, 105.7749) construction
  arc A171 (7.0189, 105.7749) -> (7.1653, 106.1284) centre (6.6653, 106.1284) ccw construction
  line L205 (7.1653, 106.1284) -> (7.1653, 109.0029) construction
  line L206 (7.1653, 109.0029) -> (7.6753, 109.9529) construction
  line L207 (7.6753, 109.9529) -> (7.1653, 110.9029) construction
  line L208 (7.1653, 110.9029) -> (7.1653, 113.7773) construction
  arc A172 (7.1653, 113.7773) -> (7.0189, 114.1309) centre (6.6653, 113.7773) ccw construction
  line L209 (7.0189, 114.1309) -> (3.0934, 118.0564) construction
  arc A173 (3.0934, 118.0564) -> (2.7398, 118.2028) centre (2.7398, 117.7028) ccw construction
  line L210 (2.7398, 118.2028) -> (0.7572, 118.2028) construction
  arc A174 (0.7572, 118.2028) -> (0.2575, 117.6854) centre (0.7572, 117.7028) ccw construction
  line L211 (0.2575, 117.6854) -> (0.2575, 114.4529) construction
  arc A175 (-0.2425, 113.9529) -> (0.2575, 114.4529) centre (-0.2425, 114.4529) ccw construction
  line L212 (-0.2425, 113.9529) -> (-1.4999, 113.9529) construction
  arc A176 (-1.9999, 114.4529) -> (-1.4999, 113.9529) centre (-1.4999, 114.4529) ccw construction
  line L213 (-1.9999, 114.4529) -> (-1.9999, 122.9528) construction
  arc A177 (0.0001, 124.9528) -> (-1.9999, 122.9528) centre (0.0001, 122.9528) ccw construction
  line L214 (0.0001, 124.9528) -> (8.5, 124.9528) construction
  arc A178 (9, 124.4528) -> (8.5, 124.9528) centre (8.5, 124.4528) ccw construction
  line L215 (9, 124.4528) -> (9, 123.1953) construction
  arc A179 (8.5, 122.6953) -> (9, 123.1953) centre (8.5, 123.1953) ccw construction
  line L216 (16.1981, 44.4942) -> (16.9799, 45.4733) construction
  arc A180 (16.9799, 45.4733) -> (15.4733, 46.9799) centre (16.1422, 46.1422) ccw construction
  line L217 (15.4733, 46.9799) -> (14.4942, 46.1981) construction
  arc A181 (14.4942, 46.1981) -> (11.5058, 46.1981) centre (13, 43) ccw construction
  line L218 (11.5058, 46.1981) -> (10.5267, 46.9799) construction
  arc A182 (10.5267, 46.9799) -> (9.0201, 45.4733) centre (9.8578, 46.1422) ccw construction
  line L219 (9.0201, 45.4733) -> (9.8019, 44.4942) construction
  arc A183 (9.8019, 44.4942) -> (9.8019, 41.5058) centre (13, 43) ccw construction
  line L220 (9.8019, 41.5058) -> (9.0201, 40.5267) construction
  arc A184 (9.0201, 40.5267) -> (10.5267, 39.0201) centre (9.8578, 39.8578) ccw construction
  line L221 (10.5267, 39.0201) -> (11.5058, 39.8019) construction
  arc A185 (11.5058, 39.8019) -> (14.4942, 39.8019) centre (13, 43) ccw construction
  line L222 (14.4942, 39.8019) -> (15.4733, 39.0201) construction
  arc A186 (15.4733, 39.0201) -> (16.9799, 40.5267) centre (16.1422, 39.8578) ccw construction
  line L223 (16.9799, 40.5267) -> (16.1981, 41.5058) construction
  arc A187 (16.1981, 41.5058) -> (16.1981, 44.4942) centre (13, 43) ccw construction
  line L224 (26.6999, 52.881) -> (26.6999, 55.6999) construction
  arc A188 (26.6999, 55.6999) -> (25.7, 56.6999) centre (25.7, 55.6999) ccw construction
  line L225 (25.7, 56.6999) -> (22.881, 56.6999) construction
  arc A189 (22.881, 56.6999) -> (22.5, 56.3189) centre (22.881, 56.3189) ccw construction
  line L226 (22.5, 56.3189) -> (22.5, 52.88) construction
  arc A190 (22.5, 52.88) -> (22.88, 52.5) centre (22.88, 52.88) ccw construction
  line L227 (22.88, 52.5) -> (26.319, 52.5) construction
  arc A191 (26.319, 52.5) -> (26.6999, 52.881) centre (26.319, 52.881) ccw construction
  line L228 (-0.6999, 33.119) -> (-0.6999, 30.3001) construction
  arc A192 (-0.6999, 30.3001) -> (0.3001, 29.3001) centre (0.3001, 30.3001) ccw construction
  line L229 (0.3001, 29.3001) -> (3.119, 29.3001) construction
  arc A193 (3.119, 29.3001) -> (3.5, 29.6811) centre (3.119, 29.6811) ccw construction
  line L230 (3.5, 29.6811) -> (3.5, 33.12) construction
  arc A194 (3.5, 33.12) -> (3.12, 33.5) centre (3.12, 33.12) ccw construction
  line L231 (3.12, 33.5) -> (-0.3189, 33.5) construction
  arc A195 (-0.3189, 33.5) -> (-0.6999, 33.119) centre (-0.3189, 33.119) ccw construction
  line L232 (22.881, 29.3001) -> (25.7, 29.3001) construction
  arc A196 (25.7, 29.3001) -> (26.6999, 30.3001) centre (25.7, 30.3001) ccw construction
  line L233 (26.6999, 30.3001) -> (26.6999, 33.119) construction
  arc A197 (26.6999, 33.119) -> (26.319, 33.5) centre (26.319, 33.119) ccw construction
  line L234 (26.319, 33.5) -> (22.88, 33.5) construction
  arc A198 (22.88, 33.5) -> (22.5, 33.12) centre (22.88, 33.12) ccw construction
  line L235 (22.5, 33.12) -> (22.5, 29.6811) construction
  arc A199 (22.5, 29.6811) -> (22.881, 29.3001) centre (22.881, 29.6811) ccw construction
  line L236 (-0.3189, 52.5) -> (3.12, 52.5) construction
  arc A200 (3.12, 52.5) -> (3.5, 52.88) centre (3.12, 52.88) ccw construction
  line L237 (3.5, 52.88) -> (3.5, 56.3189) construction
  arc A201 (3.5, 56.3189) -> (3.119, 56.6999) centre (3.119, 56.3189) ccw construction
  line L238 (3.119, 56.6999) -> (0.3001, 56.6999) construction
  arc A202 (0.3001, 56.6999) -> (-0.6999, 55.6999) centre (0.3001, 55.6999) ccw construction
  line L239 (-0.6999, 55.6999) -> (-0.6999, 52.881) construction
  arc A203 (-0.6999, 52.881) -> (-0.3189, 52.5) centre (-0.3189, 52.881) ccw construction
  line L240 (8.5, 55.7425) -> (5.2675, 55.7425) construction
  arc A204 (5.2675, 55.7425) -> (4.75, 55.2428) centre (5.25, 55.2428) ccw construction
  line L241 (4.75, 55.2428) -> (4.75, 53.2602) construction
  arc A205 (4.75, 53.2602) -> (4.8965, 52.9066) centre (5.25, 53.2602) ccw construction
  line L242 (4.8965, 52.9066) -> (8.822, 48.9811) construction
  arc A206 (8.822, 48.9811) -> (9.1756, 48.8347) centre (9.1756, 49.3347) ccw construction
  line L243 (9.1756, 48.8347) -> (12.1125, 48.8347) construction
  line L244 (12.1125, 48.8347) -> (13.0625, 48.3247) construction
  line L245 (13.0625, 48.3247) -> (14.0125, 48.8347) construction
  line L246 (14.0125, 48.8347) -> (16.8245, 48.8347) construction
  arc A207 (16.8245, 48.8347) -> (17.178, 48.9811) centre (16.8245, 49.3347) ccw construction
  line L247 (17.178, 48.9811) -> (21.1035, 52.9066) construction
  arc A208 (21.1035, 52.9066) -> (21.25, 53.2602) centre (20.75, 53.2602) ccw construction
  line L248 (21.25, 53.2602) -> (21.25, 55.2428) construction
  arc A209 (21.25, 55.2428) -> (20.7325, 55.7425) centre (20.75, 55.2428) ccw construction
  line L249 (20.7325, 55.7425) -> (17.5, 55.7425) construction
  arc A210 (17, 56.2425) -> (17.5, 55.7425) centre (17.5, 56.2425) ccw construction
  line L250 (17, 56.2425) -> (17, 57.4999) construction
  arc A211 (17.5, 57.9999) -> (17, 57.4999) centre (17.5, 57.4999) ccw construction
  line L251 (17.5, 57.9999) -> (26, 57.9999) construction
  arc A212 (27.9999, 55.9999) -> (26, 57.9999) centre (26, 55.9999) ccw construction
  line L252 (27.9999, 55.9999) -> (27.9999, 47.5) construction
  arc A213 (27.4999, 47) -> (27.9999, 47.5) centre (27.4999, 47.5) ccw construction
  line L253 (27.4999, 47) -> (26.2425, 47) construction
  arc A214 (25.7425, 47.5) -> (26.2425, 47) centre (26.2425, 47.5) ccw construction
  line L254 (25.7425, 47.5) -> (25.7425, 50.7325) construction
  arc A215 (25.7425, 50.7325) -> (25.2428, 51.25) centre (25.2428, 50.75) ccw construction
  line L255 (25.2428, 51.25) -> (23.2602, 51.25) construction
  arc A216 (23.2602, 51.25) -> (22.9066, 51.1035) centre (23.2602, 50.75) ccw construction
  line L256 (22.9066, 51.1035) -> (18.9811, 47.178) construction
  arc A217 (18.9811, 47.178) -> (18.8347, 46.8245) centre (19.3347, 46.8245) ccw construction
  line L257 (18.8347, 46.8245) -> (18.8347, 43.95) construction
  line L258 (18.8347, 43.95) -> (18.3247, 43) construction
  line L259 (18.3247, 43) -> (18.8347, 42.05) construction
  line L260 (18.8347, 42.05) -> (18.8347, 39.1755) construction
  arc A218 (18.8347, 39.1755) -> (18.9811, 38.822) centre (19.3347, 39.1755) ccw construction
  line L261 (18.9811, 38.822) -> (22.9066, 34.8965) construction
  arc A219 (22.9066, 34.8965) -> (23.2602, 34.75) centre (23.2602, 35.25) ccw construction
  line L262 (23.2602, 34.75) -> (25.2428, 34.75) construction
  arc A220 (25.2428, 34.75) -> (25.7425, 35.2675) centre (25.2428, 35.25) ccw construction
  line L263 (25.7425, 35.2675) -> (25.7425, 38.5) construction
  arc A221 (26.2425, 39) -> (25.7425, 38.5) centre (26.2425, 38.5) ccw construction
  line L264 (26.2425, 39) -> (27.4999, 39) construction
  arc A222 (27.9999, 38.5) -> (27.4999, 39) centre (27.4999, 38.5) ccw construction
  line L265 (27.9999, 38.5) -> (27.9999, 30.0001) construction
  arc A223 (26, 28.0001) -> (27.9999, 30.0001) centre (26, 30.0001) ccw construction
  line L266 (26, 28.0001) -> (17.5, 28.0001) construction
  arc A224 (17, 28.5001) -> (17.5, 28.0001) centre (17.5, 28.5001) ccw construction
  line L267 (17, 28.5001) -> (17, 29.7575) construction
  arc A225 (17.5, 30.2575) -> (17, 29.7575) centre (17.5, 29.7575) ccw construction
  line L268 (17.5, 30.2575) -> (20.7325, 30.2575) construction
  arc A226 (20.7325, 30.2575) -> (21.25, 30.7572) centre (20.75, 30.7572) ccw construction
  line L269 (21.25, 30.7572) -> (21.25, 32.7398) construction
  arc A227 (21.25, 32.7398) -> (21.1035, 33.0934) centre (20.75, 32.7398) ccw construction
  line L270 (21.1035, 33.0934) -> (17.178, 37.0189) construction
  arc A228 (17.178, 37.0189) -> (16.8245, 37.1653) centre (16.8245, 36.6653) ccw construction
  line L271 (16.8245, 37.1653) -> (14.0125, 37.1653) construction
  line L272 (14.0125, 37.1653) -> (13.0625, 37.6753) construction
  line L273 (13.0625, 37.6753) -> (12.1125, 37.1653) construction
  line L274 (12.1125, 37.1653) -> (9.1756, 37.1653) construction
  arc A229 (9.1756, 37.1653) -> (8.822, 37.0189) centre (9.1756, 36.6653) ccw construction
  line L275 (8.822, 37.0189) -> (4.8965, 33.0934) construction
  arc A230 (4.8965, 33.0934) -> (4.75, 32.7398) centre (5.25, 32.7398) ccw construction
  line L276 (4.75, 32.7398) -> (4.75, 30.7572) construction
  arc A231 (4.75, 30.7572) -> (5.2675, 30.2575) centre (5.25, 30.7572) ccw construction
  line L277 (5.2675, 30.2575) -> (8.5, 30.2575) construction
  arc A232 (9, 29.7575) -> (8.5, 30.2575) centre (8.5, 29.7575) ccw construction
  line L278 (9, 29.7575) -> (9, 28.5001) construction
  arc A233 (8.5, 28.0001) -> (9, 28.5001) centre (8.5, 28.5001) ccw construction
  line L279 (8.5, 28.0001) -> (0.0001, 28.0001) construction
  arc A234 (-1.9999, 30.0001) -> (0.0001, 28.0001) centre (0.0001, 30.0001) ccw construction
  line L280 (-1.9999, 30.0001) -> (-1.9999, 38.5) construction
  arc A235 (-1.4999, 39) -> (-1.9999, 38.5) centre (-1.4999, 38.5) ccw construction
  line L281 (-1.4999, 39) -> (-0.2425, 39) construction
  arc A236 (0.2575, 38.5) -> (-0.2425, 39) centre (-0.2425, 38.5) ccw construction
  line L282 (0.2575, 38.5) -> (0.2575, 35.2675) construction
  arc A237 (0.2575, 35.2675) -> (0.7572, 34.75) centre (0.7572, 35.25) ccw construction
  line L283 (0.7572, 34.75) -> (2.7398, 34.75) construction
  arc A238 (2.7398, 34.75) -> (3.0934, 34.8965) centre (2.7398, 35.25) ccw construction
  line L284 (3.0934, 34.8965) -> (7.0189, 38.822) construction
  arc A239 (7.0189, 38.822) -> (7.1653, 39.1755) centre (6.6653, 39.1755) ccw construction
  line L285 (7.1653, 39.1755) -> (7.1653, 42.05) construction
  line L286 (7.1653, 42.05) -> (7.6753, 43) construction
  line L287 (7.6753, 43) -> (7.1653, 43.95) construction
  line L288 (7.1653, 43.95) -> (7.1653, 46.8245) construction
  arc A240 (7.1653, 46.8245) -> (7.0189, 47.178) centre (6.6653, 46.8245) ccw construction
  line L289 (7.0189, 47.178) -> (3.0934, 51.1035) construction
  arc A241 (3.0934, 51.1035) -> (2.7398, 51.25) centre (2.7398, 50.75) ccw construction
  line L290 (2.7398, 51.25) -> (0.7572, 51.25) construction
  arc A242 (0.7572, 51.25) -> (0.2575, 50.7325) centre (0.7572, 50.75) ccw construction
  line L291 (0.2575, 50.7325) -> (0.2575, 47.5) construction
  arc A243 (-0.2425, 47) -> (0.2575, 47.5) centre (-0.2425, 47.5) ccw construction
  line L292 (-0.2425, 47) -> (-1.4999, 47) construction
  arc A244 (-1.9999, 47.5) -> (-1.4999, 47) centre (-1.4999, 47.5) ccw construction
  line L293 (-1.9999, 47.5) -> (-1.9999, 55.9999) construction
  arc A245 (0.0001, 57.9999) -> (-1.9999, 55.9999) centre (0.0001, 55.9999) ccw construction
  line L294 (0.0001, 57.9999) -> (8.5, 57.9999) construction
  arc A246 (9, 57.4999) -> (8.5, 57.9999) centre (8.5, 57.4999) ccw construction
  line L295 (9, 57.4999) -> (9, 56.2425) construction
  arc A247 (8.5, 55.7425) -> (9, 56.2425) centre (8.5, 56.2425) ccw construction
  line L296 (57.9999, 15.0099) -> (57.9999, 165.0067) construction
  line L297 (57.9999, 165.0067) -> (-1.9999, 165.0067)
  line L298 (-1.9999, 165.0067) -> (-1.9999, 14.9999)
  line L299 (-1.9999, 14.9999) -> (57.9999, 14.9999)
  line L300 (57.9999, 14.9999) -> (57.9999, 165.0067)
  circle A248 centre (13, 154.9529) radius 3.75
  circle A249 centre (13, 43) radius 3.75
  line L301 (13, 154.9529) -> (13, 43) construction
  line L302 (18.3247, 109.9529) -> (7.6753, 109.9529) construction
  circle A250 centre (13, 109.9529) radius 3.75
  point P0 (0, 0)
  dimension "d0" = 150.0068
  dimension "d1" = 59.9998
  dimension "d2" = 7.5
extrude "Plate1" add sketch "Sketch1" along normal blind 2
equation "\"BendRadius\" = Thickness"
equation "\"BendReliefWidth\" = Thickness"
equation "\"BendReliefDepth\" = 0.5 * Thickness"
equation "\"CornerReliefSize\" = 4 * Thickness"
equation "\"MinimumRemnant\" = 2 * Thickness"
equation "\"TransitionRadius\" = BendRadius"
equation "\"JacobiRadiusSize\" = BendRadius"
equation "\"GapSize\" = Thickness"
equation "\"d3\" = BendRadius"
equation "\"Thickness\" = 2"
properties part number "gabarito-suporte-motor-embaixo" material "Wood (Oak)"
